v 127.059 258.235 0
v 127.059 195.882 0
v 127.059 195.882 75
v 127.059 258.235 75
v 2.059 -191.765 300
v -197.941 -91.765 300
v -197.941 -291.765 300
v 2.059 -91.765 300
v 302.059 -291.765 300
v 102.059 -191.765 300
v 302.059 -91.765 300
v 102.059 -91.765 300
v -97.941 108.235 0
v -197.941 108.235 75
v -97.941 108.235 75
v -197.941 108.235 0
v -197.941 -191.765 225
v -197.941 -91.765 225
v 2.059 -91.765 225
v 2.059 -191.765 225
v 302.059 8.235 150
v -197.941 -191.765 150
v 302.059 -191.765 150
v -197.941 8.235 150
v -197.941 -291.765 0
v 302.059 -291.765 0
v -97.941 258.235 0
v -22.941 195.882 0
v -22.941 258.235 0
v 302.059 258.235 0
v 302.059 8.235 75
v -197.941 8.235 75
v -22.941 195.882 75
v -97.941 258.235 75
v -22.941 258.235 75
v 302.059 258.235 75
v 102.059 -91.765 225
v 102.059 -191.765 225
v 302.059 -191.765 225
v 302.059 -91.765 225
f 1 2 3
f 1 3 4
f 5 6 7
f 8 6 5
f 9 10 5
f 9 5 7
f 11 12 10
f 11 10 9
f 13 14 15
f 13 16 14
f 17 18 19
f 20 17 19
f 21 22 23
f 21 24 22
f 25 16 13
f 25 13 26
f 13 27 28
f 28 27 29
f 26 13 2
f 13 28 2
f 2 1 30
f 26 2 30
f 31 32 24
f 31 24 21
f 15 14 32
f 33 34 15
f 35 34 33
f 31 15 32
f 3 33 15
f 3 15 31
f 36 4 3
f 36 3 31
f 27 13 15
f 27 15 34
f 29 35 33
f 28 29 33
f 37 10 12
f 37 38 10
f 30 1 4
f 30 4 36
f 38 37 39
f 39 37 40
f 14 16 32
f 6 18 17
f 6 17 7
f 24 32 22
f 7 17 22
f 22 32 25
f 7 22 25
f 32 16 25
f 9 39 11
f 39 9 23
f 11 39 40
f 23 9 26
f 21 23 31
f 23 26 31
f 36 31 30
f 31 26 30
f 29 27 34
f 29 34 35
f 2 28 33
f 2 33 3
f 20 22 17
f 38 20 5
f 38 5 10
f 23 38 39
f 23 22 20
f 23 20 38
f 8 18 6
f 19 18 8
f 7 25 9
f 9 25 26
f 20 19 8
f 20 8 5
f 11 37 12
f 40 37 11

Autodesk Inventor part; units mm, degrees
ref_plane "YZ Plane" through (0, 0, 0) normal (1, 0, 0) x (0, 1, 0)
ref_plane "XZ Plane" through (0, 0, 0) normal (0, 1, 0) x (-1, 0, 0)
sketch "Sketch1" plane through (0, 0, 0) normal (0, 0, 1) x (1, 0, 0)
  line L0 (-197.9412, -291.7647) -> (-197.9412, 108.2353)
  line L1 (-197.9412, 108.2353) -> (-97.9412, 108.2353)
  line L2 (-97.9412, 108.2353) -> (-97.9412, 258.2353)
  line L3 (-97.9412, 258.2353) -> (-22.9412, 258.2353)
  line L4 (-22.9412, 258.2353) -> (-22.9412, 195.8824)
  line L5 (-22.9412, 195.8824) -> (127.0588, 195.8824)
  line L6 (127.0588, 195.8824) -> (127.0588, 258.2353)
  line L7 (127.0588, 258.2353) -> (302.0588, 258.2353)
  line L8 (302.0588, 258.2353) -> (302.0588, -291.7647)
  line L9 (302.0588, -291.7647) -> (-197.9412, -291.7647)
  point P0 (0, 0)
  dimension "d0" = 100
  dimension "d1" = 75
  dimension "d2" = 150
  dimension "d3" = 500
  dimension "d4" = 400
  dimension "d5" = 550
extrude "Extrusion1" add sketch "Sketch1" along normal blind 75
sketch "Sketch2" plane through (0, 0, 75) normal (0, 0, 1) x (1, 0, 0)
  point P0 (0, 0)
ref_plane "Work Plane1" through (0, 0, 75) normal (0, 0, 1) x (1, 0, 0)
sketch "Sketch3" plane through (0, 0, 75) normal (0, 0, 1) x (1, 0, 0)
  line L0 (-197.9412, -291.7647) -> (-197.9412, 8.2353)
  line L1 (-197.9412, 8.2353) -> (302.0588, 8.2353)
  line L2 (302.0588, 8.2353) -> (302.0588, -291.7647)
  line L3 (302.0588, -291.7647) -> (-197.9412, -291.7647)
  line L4 (-197.9412, -291.7647) -> (302.0588, -291.7647) projected
  line L5 (-197.9412, 108.2353) -> (-197.9412, -291.7647) projected
  point P0 (0, 0)
  dimension "d9" = 300
  dimension "d10" = 500
extrude "Extrusion2" add sketch "Sketch3" along normal blind 75
ref_plane "Work Plane2" through (0, 0, 150) normal (0, 0, 1) x (1, 0, 0)
sketch "Sketch4" plane through (0, 0, 150) normal (0, 0, 1) x (1, 0, 0)
  line L0 (-197.9412, 108.2353) -> (-197.9412, -291.7647) projected
  line L1 (-197.9412, -191.7647) -> (302.0588, -191.7647)
  line L2 (302.0588, -291.7647) -> (302.0588, 258.2353) projected
  line L3 (-197.9412, -291.7647) -> (302.0588, -291.7647) projected
  point P0 (0, 0)
  dimension "d14" = 100
extrude "Extrusion3" add sketch "Sketch4" along normal blind 75
ref_plane "Work Plane3" through (0, 0, 225) normal (0, 0, 1) x (1, 0, 0)
sketch "Sketch5" plane through (0, 0, 225) normal (0, 0, 1) x (1, 0, 0)
  line L0 (-197.9412, 8.2353) -> (-197.9412, -191.7647) projected
  line L1 (-197.9412, -91.7647) -> (2.0588, -91.7647)
  line L2 (2.0588, -91.7647) -> (2.0588, -191.7647)
  line L3 (-197.9412, -191.7647) -> (302.0588, -191.7647) projected
  line L4 (102.0588, -191.7647) -> (102.0588, -91.7647)
  line L5 (102.0588, -91.7647) -> (302.0588, -91.7647)
  line L6 (302.0588, -191.7647) -> (-197.9412, -191.7647) projected
  line L7 (302.0588, -91.7647) -> (302.0588, -191.7647)
  line L8 (302.0588, -191.7647) -> (302.0588, -291.7647)
  line L9 (-197.9412, -291.7647) -> (302.0588, -291.7647) projected
  line L10 (302.0588, -291.7647) -> (-197.9412, -291.7647)
  line L11 (-197.9412, -291.7647) -> (-197.9412, -91.7647)
  line L12 (2.0588, -191.7647) -> (102.0588, -191.7647)
  point P0 (0, 0)
  dimension "d18" = 200
  dimension "d19" = 200
  dimension "d20" = 100
  dimension "d21" = 100
extrude "Extrusion4" add sketch "Sketch5" along normal blind 75
properties part number "BT011"
